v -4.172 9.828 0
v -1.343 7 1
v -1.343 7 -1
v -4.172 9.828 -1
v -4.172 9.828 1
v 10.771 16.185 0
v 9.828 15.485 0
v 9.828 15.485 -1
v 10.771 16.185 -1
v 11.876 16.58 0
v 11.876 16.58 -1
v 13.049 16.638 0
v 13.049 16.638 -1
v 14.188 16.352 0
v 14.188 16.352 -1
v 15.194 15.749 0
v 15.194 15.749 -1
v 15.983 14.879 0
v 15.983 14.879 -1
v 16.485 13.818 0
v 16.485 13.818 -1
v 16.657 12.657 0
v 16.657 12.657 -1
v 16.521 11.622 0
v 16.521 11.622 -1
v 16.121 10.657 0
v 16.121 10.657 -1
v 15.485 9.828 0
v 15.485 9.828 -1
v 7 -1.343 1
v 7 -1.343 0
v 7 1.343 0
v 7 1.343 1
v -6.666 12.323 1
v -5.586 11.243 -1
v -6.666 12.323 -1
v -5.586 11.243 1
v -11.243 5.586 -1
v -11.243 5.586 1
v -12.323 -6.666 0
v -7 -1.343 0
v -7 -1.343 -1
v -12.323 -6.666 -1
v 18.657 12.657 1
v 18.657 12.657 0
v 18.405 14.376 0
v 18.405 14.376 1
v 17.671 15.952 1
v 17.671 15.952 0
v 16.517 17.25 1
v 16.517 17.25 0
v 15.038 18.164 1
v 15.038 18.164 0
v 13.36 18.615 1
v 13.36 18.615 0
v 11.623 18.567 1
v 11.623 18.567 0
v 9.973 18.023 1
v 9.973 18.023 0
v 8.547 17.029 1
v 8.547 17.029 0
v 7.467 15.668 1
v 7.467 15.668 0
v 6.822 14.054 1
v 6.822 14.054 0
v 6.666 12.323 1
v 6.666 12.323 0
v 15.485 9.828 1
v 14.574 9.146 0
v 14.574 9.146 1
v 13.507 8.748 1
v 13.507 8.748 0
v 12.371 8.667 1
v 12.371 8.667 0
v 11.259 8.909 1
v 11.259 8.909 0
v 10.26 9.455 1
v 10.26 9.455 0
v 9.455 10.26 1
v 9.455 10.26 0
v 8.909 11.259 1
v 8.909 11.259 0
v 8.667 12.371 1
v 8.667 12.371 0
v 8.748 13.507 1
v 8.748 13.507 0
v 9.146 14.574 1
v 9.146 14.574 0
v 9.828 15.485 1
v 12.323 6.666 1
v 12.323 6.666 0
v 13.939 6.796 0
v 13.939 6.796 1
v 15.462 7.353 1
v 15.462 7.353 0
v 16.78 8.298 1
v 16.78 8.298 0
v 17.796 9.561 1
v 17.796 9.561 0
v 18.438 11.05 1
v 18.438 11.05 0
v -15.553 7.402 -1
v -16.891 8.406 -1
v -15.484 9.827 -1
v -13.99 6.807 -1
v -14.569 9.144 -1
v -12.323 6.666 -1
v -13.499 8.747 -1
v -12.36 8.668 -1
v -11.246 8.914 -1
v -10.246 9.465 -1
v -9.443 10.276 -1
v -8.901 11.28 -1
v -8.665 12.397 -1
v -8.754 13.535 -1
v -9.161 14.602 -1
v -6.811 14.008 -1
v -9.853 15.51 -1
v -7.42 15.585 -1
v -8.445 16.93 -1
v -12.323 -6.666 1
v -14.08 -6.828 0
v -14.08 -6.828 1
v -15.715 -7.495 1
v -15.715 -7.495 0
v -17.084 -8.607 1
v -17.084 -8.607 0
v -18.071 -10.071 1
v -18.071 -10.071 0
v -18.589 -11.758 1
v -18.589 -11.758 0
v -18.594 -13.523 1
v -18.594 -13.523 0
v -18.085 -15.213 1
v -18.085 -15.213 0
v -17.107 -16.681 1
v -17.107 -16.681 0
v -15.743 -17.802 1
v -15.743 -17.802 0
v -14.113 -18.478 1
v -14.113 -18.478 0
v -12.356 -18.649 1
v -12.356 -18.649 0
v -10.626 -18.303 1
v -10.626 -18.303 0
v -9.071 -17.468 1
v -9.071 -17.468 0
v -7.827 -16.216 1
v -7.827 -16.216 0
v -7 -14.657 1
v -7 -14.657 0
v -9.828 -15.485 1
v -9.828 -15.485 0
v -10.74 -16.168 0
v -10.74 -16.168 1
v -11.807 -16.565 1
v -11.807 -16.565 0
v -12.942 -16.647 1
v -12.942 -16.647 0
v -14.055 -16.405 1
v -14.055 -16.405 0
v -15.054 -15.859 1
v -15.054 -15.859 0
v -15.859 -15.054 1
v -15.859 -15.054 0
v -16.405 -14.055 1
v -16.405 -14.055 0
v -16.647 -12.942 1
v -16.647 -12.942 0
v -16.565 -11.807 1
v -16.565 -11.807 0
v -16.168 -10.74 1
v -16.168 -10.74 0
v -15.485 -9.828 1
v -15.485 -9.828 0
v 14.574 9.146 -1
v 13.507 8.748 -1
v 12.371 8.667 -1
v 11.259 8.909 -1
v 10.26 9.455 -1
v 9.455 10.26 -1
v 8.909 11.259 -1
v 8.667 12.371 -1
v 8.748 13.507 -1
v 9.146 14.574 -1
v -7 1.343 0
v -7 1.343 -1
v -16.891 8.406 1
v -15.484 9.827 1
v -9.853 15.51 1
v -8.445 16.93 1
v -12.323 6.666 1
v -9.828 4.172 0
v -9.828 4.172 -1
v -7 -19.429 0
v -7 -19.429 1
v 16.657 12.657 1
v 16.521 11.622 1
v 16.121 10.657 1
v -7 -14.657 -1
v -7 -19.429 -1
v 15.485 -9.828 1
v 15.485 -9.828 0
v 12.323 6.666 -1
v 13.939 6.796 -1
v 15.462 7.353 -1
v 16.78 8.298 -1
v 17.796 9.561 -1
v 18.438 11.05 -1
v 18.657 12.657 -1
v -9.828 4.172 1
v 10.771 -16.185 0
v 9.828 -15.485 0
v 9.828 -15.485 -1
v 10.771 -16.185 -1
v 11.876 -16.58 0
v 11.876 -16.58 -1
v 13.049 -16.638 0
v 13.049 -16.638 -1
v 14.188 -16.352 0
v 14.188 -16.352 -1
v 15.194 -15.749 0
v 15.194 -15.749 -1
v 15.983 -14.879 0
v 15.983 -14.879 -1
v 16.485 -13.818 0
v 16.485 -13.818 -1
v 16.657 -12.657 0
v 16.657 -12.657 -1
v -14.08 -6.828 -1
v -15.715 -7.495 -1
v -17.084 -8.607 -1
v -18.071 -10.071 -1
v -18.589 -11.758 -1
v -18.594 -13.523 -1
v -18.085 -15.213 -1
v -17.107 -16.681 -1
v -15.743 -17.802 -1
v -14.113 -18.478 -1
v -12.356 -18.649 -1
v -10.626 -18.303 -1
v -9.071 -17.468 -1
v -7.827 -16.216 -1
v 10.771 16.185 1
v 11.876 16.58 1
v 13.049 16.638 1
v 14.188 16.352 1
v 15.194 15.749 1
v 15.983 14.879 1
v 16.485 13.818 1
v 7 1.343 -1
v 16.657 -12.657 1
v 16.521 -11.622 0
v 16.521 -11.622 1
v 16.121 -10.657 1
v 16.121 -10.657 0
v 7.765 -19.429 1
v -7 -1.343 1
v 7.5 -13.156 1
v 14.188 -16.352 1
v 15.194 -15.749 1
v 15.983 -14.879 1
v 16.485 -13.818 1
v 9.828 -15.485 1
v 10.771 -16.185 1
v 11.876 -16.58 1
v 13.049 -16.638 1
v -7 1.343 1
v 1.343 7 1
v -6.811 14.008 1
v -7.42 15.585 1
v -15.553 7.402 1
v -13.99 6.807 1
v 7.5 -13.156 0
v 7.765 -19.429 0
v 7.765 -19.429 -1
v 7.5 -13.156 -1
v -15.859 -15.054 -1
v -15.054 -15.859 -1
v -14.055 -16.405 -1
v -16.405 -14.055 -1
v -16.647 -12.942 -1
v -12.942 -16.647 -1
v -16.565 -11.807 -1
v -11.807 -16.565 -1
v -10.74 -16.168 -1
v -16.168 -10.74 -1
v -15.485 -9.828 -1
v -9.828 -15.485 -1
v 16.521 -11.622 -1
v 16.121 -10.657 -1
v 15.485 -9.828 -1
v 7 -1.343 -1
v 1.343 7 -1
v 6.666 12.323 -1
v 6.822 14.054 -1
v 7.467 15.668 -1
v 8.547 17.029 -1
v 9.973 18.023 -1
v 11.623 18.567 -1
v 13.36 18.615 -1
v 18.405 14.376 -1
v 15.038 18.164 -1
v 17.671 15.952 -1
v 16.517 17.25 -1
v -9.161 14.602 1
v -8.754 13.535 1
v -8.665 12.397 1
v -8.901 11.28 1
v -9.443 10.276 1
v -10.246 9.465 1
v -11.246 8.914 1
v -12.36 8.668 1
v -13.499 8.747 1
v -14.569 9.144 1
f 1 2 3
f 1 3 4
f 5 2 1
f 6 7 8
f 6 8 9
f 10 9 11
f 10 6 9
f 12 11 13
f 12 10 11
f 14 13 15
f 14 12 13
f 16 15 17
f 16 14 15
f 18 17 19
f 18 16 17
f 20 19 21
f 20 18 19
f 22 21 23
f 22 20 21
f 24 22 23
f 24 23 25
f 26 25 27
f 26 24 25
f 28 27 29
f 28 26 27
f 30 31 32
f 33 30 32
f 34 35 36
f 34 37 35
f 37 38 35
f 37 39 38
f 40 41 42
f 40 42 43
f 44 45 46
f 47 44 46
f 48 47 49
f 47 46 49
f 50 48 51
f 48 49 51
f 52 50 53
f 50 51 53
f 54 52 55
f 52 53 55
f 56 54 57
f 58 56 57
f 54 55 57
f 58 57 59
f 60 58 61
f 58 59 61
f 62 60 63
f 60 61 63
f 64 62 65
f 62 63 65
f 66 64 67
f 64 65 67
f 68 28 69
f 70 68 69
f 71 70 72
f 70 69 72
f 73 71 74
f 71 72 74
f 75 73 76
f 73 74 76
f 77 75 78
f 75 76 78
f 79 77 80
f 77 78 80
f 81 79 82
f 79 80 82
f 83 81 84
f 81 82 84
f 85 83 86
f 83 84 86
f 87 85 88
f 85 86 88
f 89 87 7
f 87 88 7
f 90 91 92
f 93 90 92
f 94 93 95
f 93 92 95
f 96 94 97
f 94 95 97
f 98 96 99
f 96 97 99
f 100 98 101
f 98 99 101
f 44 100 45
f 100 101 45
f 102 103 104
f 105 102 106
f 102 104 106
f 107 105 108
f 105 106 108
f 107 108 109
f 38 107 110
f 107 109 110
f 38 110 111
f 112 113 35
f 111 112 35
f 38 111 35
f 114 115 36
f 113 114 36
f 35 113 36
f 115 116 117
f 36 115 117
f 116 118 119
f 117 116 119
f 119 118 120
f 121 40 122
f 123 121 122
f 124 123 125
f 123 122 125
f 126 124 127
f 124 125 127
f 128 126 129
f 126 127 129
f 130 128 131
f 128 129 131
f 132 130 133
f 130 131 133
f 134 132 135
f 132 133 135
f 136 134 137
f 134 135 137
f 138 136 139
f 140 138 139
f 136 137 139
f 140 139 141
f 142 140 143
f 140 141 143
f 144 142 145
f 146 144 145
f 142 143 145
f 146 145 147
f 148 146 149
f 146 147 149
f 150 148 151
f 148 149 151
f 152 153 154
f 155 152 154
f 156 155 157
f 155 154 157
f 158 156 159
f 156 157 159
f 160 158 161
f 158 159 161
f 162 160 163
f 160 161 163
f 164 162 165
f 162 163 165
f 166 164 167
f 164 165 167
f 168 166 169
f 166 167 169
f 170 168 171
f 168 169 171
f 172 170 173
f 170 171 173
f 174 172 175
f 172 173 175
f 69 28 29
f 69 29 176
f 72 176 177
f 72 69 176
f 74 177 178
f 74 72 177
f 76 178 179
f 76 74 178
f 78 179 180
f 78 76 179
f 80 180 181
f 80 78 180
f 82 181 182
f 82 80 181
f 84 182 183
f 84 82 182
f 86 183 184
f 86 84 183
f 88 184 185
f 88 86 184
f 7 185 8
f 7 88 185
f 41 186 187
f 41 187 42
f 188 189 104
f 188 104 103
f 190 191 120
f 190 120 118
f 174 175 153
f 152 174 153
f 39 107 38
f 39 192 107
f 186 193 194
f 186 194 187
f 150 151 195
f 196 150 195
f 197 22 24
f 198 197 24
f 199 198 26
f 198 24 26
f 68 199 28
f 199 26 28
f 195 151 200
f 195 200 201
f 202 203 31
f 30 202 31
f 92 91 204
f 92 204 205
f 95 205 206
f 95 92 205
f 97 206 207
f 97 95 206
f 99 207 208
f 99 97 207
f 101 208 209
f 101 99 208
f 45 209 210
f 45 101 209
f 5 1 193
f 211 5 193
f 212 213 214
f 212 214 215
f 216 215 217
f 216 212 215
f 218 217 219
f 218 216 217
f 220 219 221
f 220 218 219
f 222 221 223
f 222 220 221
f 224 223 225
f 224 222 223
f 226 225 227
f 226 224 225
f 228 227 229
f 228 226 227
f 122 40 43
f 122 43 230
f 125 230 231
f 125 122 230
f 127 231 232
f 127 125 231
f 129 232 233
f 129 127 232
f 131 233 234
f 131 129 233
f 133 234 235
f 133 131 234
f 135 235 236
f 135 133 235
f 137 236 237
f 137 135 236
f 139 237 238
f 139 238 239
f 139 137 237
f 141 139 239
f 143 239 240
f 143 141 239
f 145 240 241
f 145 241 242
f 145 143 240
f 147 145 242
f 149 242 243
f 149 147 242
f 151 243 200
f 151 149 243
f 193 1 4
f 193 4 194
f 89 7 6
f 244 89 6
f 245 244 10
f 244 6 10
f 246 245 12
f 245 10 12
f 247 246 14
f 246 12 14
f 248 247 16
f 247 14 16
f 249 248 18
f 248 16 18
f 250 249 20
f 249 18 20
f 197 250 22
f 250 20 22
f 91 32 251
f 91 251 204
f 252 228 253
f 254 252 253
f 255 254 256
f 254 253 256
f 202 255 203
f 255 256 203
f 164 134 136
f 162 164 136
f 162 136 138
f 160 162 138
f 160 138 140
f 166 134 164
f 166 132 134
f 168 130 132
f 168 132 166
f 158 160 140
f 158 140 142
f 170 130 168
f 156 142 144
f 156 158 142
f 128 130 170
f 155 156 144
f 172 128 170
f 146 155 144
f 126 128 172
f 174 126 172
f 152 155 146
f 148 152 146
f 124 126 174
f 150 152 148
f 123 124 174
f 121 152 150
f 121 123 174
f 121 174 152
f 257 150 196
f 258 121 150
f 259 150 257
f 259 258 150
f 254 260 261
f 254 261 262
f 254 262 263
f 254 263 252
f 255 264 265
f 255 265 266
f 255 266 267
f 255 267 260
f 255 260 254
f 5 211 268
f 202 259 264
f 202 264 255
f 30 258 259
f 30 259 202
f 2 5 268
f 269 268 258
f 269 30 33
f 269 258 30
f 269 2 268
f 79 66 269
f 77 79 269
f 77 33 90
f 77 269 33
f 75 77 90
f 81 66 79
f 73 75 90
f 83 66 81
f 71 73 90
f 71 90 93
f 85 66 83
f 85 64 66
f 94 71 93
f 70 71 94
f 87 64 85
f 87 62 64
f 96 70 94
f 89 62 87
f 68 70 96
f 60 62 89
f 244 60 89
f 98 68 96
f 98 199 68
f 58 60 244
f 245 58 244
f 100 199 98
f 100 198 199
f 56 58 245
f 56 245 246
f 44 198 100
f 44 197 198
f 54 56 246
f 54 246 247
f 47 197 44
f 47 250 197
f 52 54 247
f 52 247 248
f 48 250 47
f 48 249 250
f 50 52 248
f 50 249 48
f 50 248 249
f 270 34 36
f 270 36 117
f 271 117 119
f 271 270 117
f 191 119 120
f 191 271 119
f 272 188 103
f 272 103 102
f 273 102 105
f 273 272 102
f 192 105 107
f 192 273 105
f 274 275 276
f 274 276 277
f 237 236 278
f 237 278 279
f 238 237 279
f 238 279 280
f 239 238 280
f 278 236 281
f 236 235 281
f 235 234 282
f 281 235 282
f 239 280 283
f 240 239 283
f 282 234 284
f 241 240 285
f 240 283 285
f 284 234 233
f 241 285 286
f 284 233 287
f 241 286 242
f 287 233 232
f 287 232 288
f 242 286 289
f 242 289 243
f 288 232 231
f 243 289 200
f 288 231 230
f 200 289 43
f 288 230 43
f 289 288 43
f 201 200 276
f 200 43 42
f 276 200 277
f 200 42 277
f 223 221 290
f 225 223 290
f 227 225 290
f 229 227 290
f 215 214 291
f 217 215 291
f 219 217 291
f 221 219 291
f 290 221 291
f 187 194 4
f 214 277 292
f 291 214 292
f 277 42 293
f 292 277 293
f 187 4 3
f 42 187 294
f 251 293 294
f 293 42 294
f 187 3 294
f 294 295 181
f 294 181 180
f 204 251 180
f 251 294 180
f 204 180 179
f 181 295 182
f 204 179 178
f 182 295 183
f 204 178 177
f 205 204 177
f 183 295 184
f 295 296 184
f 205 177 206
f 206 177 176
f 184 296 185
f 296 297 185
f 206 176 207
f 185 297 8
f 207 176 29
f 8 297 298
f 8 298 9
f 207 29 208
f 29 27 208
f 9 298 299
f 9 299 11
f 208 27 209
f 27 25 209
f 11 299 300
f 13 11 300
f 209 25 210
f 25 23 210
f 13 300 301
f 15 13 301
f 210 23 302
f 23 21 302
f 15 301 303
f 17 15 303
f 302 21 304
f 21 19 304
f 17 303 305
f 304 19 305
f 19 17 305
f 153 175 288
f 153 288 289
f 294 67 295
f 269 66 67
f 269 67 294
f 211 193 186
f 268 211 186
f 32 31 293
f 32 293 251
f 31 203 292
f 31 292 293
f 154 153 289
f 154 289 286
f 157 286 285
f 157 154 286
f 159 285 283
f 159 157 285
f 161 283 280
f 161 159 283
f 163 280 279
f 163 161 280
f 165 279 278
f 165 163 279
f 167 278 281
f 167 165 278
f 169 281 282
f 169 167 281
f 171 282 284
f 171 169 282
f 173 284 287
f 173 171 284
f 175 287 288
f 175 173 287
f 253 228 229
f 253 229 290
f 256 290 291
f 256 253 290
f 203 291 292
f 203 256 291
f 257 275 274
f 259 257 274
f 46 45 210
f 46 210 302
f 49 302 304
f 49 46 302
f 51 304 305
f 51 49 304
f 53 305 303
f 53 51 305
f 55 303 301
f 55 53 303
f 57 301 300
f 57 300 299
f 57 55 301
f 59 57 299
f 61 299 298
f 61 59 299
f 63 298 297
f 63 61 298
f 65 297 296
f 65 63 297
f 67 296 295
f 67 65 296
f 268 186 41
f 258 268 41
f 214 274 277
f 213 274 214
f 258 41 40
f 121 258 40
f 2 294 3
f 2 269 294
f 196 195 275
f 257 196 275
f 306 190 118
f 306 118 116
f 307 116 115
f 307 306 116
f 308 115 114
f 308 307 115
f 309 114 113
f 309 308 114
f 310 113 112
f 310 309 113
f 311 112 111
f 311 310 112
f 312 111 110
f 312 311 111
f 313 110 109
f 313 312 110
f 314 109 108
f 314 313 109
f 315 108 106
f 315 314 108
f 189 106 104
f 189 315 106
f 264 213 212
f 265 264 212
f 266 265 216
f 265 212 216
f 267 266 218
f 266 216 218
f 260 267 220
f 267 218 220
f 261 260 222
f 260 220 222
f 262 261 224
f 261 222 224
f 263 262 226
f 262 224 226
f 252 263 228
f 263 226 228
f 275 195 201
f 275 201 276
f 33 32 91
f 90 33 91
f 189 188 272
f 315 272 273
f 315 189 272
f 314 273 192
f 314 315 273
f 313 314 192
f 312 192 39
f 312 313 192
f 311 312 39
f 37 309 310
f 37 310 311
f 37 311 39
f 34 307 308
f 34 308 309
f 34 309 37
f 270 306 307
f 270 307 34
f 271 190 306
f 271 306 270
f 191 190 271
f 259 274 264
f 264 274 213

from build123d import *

# Parameters (mm, degrees)
F1_DEPTH = 1


# Not quite as in the source:
# - ends of sketch curves that miss each other by under 0.0002 mm in the source are joined


with BuildPart() as f1:
    # F0 (on Top) → F1 (new body, symmetric)
    with BuildSketch(Plane.XY):
        with BuildLine():
            Line((1.3431457505, 7), (-1.3431457505, 7))
            Line((-1.3431457505, 7), (-4.1715728753, 9.8284271247))
            Line((-4.1715728753, 9.8284271247), (-9.8284271247, 4.1715728753))
            Line((-9.8284271247, 4.1715728753), (-7, 1.3431457505))
            Line((-7, 1.3431457505), (-7, -1.3431457505))
            Line((-7, -1.3431457505), (-7, -12.6568542495))
            Line((-7, -12.6568542495), (-6.6661494646, -12.3230037141))
            Line((-6.6661494646, -12.3230037141), (-1.3431457505, -7))
            Line((-1.3431457505, -7), (1.3431457505, -7))
            Line((1.3431457505, -7), (7.4995861066, -13.1564403561))
            Line((7.4995861066, -13.1564403561), (7, -1.3431457505))
            Line((7, -1.3431457505), (7, 1.3431457505))
            Line((7, 1.3431457505), (12.3230037141, 6.6661494646))
            ThreePointArc((12.3230037141, 6.6661494646), (8.4142135624, 8.4142135624), (6.6661494646, 12.3230037141))
            Line((6.6661494646, 12.3230037141), (1.3431457505, 7))
        make_face()
        with BuildLine():
            ThreePointArc((18.6568542495, 12.6568542495), (12.4898642939, 18.6545299955), (6.6661494646, 12.3230037141))
            Line((6.6661494646, 12.3230037141), (9.8284271247, 15.4852813742))
            ThreePointArc((9.8284271247, 15.4852813742), (14.187587979, 16.3523723795), (16.6568542495, 12.6568542495))
            ThreePointArc((16.6568542495, 12.6568542495), (16.3523723795, 11.12612052), (15.4852813742, 9.8284271247))
            Line((15.4852813742, 9.8284271247), (12.3230037141, 6.6661494646))
            ThreePointArc((12.3230037141, 6.6661494646), (16.7797717109, 8.2977773281), (18.6568542495, 12.6568542495))
        make_face()
        with BuildLine():
            Line((9.8284271247, 15.4852813742), (6.6661494646, 12.3230037141))
            ThreePointArc((6.6661494646, 12.3230037141), (8.4142135624, 8.4142135624), (12.3230037141, 6.6661494646))
            Line((12.3230037141, 6.6661494646), (15.4852813742, 9.8284271247))
            ThreePointArc((15.4852813742, 9.8284271247), (9.8284271247, 9.8284271247), (9.8284271247, 15.4852813742))
        make_face()
        Polygon((-7, -12.6568542495), (-7, -1.3431457505), (-12.3230037141, -6.6661494646), (-15.4852813742, -9.8284271247), (-9.8284271247, -15.4852813742), align=None)
        with BuildLine():
            Line((15.4852813742, -9.8284271247), (7, -1.3431457505))
            Line((7, -1.3431457505), (7.4995861066, -13.1564403561))
            Line((7.4995861066, -13.1564403561), (9.8284271247, -15.4852813742))
            ThreePointArc((9.8284271247, -15.4852813742), (9.8284271247, -9.8284271247), (15.4852813742, -9.8284271247))
        make_face()
        with BuildLine():
            Line((-15.4852813742, -9.8284271247), (-12.3230037141, -6.6661494646))
            ThreePointArc((-12.3230037141, -6.6661494646), (-17.6503476854, -15.9832672282), (-7, -14.6568542495))
            Line((-7, -14.6568542495), (-7, -12.6568542495))
            Line((-7, -12.6568542495), (-9.8284271247, -15.4852813742))
            ThreePointArc((-9.8284271247, -15.4852813742), (-15.4852813742, -15.4852813742), (-15.4852813742, -9.8284271247))
        make_face()
        with BuildLine():
            Line((-6.6661494646, -12.3230037141), (-7, -12.6568542495))
            Line((-7, -12.6568542495), (-7, -14.6568542495))
            ThreePointArc((-7, -14.6568542495), (-6.717315341, -13.5064880262), (-6.6661494646, -12.3230037141))
        make_face()
        with BuildLine():
            ThreePointArc((16.6568542495, -12.6568542495), (16.3523723795, -11.12612052), (15.4852813742, -9.8284271247))
            Line((15.4852813742, -9.8284271247), (9.8284271247, -15.4852813742))
            ThreePointArc((9.8284271247, -15.4852813742), (14.187587979, -16.3523723795), (16.6568542495, -12.6568542495))
        make_face()
        with BuildLine():
            Line((9.8284271247, -15.4852813742), (15.4852813742, -9.8284271247))
            ThreePointArc((15.4852813742, -9.8284271247), (9.8284271247, -9.8284271247), (9.8284271247, -15.4852813742))
        make_face()
        with BuildLine():
            Line((7.7648614533, -19.4291844964), (7.4995861066, -13.1564403561))
            Line((7.4995861066, -13.1564403561), (1.3431457505, -7))
            Line((1.3431457505, -7), (-1.3431457505, -7))
            Line((-1.3431457505, -7), (-6.6661494646, -12.3230037141))
            ThreePointArc((-6.6661494646, -12.3230037141), (-6.717315341, -13.5064880262), (-7, -14.6568542495))
            Line((-7, -14.6568542495), (-7, -19.4291844964))
            Line((-7, -19.4291844964), (7.7648614533, -19.4291844964))
        make_face()
    extrude(amount=F1_DEPTH, both=True)


with BuildPart() as f1b:
    # F0 (on Top) → F1, piece 2 (new body, symmetric)
    with BuildSketch(Plane.XY):
        with BuildLine():
            Line((-5.5857864376, 11.2426406871), (-6.6661494646, 12.3230037141))
            ThreePointArc((-6.6661494646, 12.3230037141), (-7.059654803, 14.8181867913), (-8.4452303219, 16.9302865811))
            Line((-8.4452303219, 16.9302865811), (-9.8529299986, 15.5095737932))
            ThreePointArc((-9.8529299986, 15.5095737932), (-9.8154440182, 9.841470102), (-15.483652679, 9.8267993668))
            Line((-15.483652679, 9.8267993668), (-16.8913523576, 8.4060865808))
            ThreePointArc((-16.8913523576, 8.4060865808), (-14.7924122945, 7.0497701734), (-12.3230037141, 6.6661494646))
            Line((-12.3230037141, 6.6661494646), (-11.2426406871, 5.5857864376))
            Line((-11.2426406871, 5.5857864376), (-5.5857864376, 11.2426406871))
        make_face()
    extrude(amount=F1_DEPTH, both=True)


solid = Compound([f1.part, f1b.part])
